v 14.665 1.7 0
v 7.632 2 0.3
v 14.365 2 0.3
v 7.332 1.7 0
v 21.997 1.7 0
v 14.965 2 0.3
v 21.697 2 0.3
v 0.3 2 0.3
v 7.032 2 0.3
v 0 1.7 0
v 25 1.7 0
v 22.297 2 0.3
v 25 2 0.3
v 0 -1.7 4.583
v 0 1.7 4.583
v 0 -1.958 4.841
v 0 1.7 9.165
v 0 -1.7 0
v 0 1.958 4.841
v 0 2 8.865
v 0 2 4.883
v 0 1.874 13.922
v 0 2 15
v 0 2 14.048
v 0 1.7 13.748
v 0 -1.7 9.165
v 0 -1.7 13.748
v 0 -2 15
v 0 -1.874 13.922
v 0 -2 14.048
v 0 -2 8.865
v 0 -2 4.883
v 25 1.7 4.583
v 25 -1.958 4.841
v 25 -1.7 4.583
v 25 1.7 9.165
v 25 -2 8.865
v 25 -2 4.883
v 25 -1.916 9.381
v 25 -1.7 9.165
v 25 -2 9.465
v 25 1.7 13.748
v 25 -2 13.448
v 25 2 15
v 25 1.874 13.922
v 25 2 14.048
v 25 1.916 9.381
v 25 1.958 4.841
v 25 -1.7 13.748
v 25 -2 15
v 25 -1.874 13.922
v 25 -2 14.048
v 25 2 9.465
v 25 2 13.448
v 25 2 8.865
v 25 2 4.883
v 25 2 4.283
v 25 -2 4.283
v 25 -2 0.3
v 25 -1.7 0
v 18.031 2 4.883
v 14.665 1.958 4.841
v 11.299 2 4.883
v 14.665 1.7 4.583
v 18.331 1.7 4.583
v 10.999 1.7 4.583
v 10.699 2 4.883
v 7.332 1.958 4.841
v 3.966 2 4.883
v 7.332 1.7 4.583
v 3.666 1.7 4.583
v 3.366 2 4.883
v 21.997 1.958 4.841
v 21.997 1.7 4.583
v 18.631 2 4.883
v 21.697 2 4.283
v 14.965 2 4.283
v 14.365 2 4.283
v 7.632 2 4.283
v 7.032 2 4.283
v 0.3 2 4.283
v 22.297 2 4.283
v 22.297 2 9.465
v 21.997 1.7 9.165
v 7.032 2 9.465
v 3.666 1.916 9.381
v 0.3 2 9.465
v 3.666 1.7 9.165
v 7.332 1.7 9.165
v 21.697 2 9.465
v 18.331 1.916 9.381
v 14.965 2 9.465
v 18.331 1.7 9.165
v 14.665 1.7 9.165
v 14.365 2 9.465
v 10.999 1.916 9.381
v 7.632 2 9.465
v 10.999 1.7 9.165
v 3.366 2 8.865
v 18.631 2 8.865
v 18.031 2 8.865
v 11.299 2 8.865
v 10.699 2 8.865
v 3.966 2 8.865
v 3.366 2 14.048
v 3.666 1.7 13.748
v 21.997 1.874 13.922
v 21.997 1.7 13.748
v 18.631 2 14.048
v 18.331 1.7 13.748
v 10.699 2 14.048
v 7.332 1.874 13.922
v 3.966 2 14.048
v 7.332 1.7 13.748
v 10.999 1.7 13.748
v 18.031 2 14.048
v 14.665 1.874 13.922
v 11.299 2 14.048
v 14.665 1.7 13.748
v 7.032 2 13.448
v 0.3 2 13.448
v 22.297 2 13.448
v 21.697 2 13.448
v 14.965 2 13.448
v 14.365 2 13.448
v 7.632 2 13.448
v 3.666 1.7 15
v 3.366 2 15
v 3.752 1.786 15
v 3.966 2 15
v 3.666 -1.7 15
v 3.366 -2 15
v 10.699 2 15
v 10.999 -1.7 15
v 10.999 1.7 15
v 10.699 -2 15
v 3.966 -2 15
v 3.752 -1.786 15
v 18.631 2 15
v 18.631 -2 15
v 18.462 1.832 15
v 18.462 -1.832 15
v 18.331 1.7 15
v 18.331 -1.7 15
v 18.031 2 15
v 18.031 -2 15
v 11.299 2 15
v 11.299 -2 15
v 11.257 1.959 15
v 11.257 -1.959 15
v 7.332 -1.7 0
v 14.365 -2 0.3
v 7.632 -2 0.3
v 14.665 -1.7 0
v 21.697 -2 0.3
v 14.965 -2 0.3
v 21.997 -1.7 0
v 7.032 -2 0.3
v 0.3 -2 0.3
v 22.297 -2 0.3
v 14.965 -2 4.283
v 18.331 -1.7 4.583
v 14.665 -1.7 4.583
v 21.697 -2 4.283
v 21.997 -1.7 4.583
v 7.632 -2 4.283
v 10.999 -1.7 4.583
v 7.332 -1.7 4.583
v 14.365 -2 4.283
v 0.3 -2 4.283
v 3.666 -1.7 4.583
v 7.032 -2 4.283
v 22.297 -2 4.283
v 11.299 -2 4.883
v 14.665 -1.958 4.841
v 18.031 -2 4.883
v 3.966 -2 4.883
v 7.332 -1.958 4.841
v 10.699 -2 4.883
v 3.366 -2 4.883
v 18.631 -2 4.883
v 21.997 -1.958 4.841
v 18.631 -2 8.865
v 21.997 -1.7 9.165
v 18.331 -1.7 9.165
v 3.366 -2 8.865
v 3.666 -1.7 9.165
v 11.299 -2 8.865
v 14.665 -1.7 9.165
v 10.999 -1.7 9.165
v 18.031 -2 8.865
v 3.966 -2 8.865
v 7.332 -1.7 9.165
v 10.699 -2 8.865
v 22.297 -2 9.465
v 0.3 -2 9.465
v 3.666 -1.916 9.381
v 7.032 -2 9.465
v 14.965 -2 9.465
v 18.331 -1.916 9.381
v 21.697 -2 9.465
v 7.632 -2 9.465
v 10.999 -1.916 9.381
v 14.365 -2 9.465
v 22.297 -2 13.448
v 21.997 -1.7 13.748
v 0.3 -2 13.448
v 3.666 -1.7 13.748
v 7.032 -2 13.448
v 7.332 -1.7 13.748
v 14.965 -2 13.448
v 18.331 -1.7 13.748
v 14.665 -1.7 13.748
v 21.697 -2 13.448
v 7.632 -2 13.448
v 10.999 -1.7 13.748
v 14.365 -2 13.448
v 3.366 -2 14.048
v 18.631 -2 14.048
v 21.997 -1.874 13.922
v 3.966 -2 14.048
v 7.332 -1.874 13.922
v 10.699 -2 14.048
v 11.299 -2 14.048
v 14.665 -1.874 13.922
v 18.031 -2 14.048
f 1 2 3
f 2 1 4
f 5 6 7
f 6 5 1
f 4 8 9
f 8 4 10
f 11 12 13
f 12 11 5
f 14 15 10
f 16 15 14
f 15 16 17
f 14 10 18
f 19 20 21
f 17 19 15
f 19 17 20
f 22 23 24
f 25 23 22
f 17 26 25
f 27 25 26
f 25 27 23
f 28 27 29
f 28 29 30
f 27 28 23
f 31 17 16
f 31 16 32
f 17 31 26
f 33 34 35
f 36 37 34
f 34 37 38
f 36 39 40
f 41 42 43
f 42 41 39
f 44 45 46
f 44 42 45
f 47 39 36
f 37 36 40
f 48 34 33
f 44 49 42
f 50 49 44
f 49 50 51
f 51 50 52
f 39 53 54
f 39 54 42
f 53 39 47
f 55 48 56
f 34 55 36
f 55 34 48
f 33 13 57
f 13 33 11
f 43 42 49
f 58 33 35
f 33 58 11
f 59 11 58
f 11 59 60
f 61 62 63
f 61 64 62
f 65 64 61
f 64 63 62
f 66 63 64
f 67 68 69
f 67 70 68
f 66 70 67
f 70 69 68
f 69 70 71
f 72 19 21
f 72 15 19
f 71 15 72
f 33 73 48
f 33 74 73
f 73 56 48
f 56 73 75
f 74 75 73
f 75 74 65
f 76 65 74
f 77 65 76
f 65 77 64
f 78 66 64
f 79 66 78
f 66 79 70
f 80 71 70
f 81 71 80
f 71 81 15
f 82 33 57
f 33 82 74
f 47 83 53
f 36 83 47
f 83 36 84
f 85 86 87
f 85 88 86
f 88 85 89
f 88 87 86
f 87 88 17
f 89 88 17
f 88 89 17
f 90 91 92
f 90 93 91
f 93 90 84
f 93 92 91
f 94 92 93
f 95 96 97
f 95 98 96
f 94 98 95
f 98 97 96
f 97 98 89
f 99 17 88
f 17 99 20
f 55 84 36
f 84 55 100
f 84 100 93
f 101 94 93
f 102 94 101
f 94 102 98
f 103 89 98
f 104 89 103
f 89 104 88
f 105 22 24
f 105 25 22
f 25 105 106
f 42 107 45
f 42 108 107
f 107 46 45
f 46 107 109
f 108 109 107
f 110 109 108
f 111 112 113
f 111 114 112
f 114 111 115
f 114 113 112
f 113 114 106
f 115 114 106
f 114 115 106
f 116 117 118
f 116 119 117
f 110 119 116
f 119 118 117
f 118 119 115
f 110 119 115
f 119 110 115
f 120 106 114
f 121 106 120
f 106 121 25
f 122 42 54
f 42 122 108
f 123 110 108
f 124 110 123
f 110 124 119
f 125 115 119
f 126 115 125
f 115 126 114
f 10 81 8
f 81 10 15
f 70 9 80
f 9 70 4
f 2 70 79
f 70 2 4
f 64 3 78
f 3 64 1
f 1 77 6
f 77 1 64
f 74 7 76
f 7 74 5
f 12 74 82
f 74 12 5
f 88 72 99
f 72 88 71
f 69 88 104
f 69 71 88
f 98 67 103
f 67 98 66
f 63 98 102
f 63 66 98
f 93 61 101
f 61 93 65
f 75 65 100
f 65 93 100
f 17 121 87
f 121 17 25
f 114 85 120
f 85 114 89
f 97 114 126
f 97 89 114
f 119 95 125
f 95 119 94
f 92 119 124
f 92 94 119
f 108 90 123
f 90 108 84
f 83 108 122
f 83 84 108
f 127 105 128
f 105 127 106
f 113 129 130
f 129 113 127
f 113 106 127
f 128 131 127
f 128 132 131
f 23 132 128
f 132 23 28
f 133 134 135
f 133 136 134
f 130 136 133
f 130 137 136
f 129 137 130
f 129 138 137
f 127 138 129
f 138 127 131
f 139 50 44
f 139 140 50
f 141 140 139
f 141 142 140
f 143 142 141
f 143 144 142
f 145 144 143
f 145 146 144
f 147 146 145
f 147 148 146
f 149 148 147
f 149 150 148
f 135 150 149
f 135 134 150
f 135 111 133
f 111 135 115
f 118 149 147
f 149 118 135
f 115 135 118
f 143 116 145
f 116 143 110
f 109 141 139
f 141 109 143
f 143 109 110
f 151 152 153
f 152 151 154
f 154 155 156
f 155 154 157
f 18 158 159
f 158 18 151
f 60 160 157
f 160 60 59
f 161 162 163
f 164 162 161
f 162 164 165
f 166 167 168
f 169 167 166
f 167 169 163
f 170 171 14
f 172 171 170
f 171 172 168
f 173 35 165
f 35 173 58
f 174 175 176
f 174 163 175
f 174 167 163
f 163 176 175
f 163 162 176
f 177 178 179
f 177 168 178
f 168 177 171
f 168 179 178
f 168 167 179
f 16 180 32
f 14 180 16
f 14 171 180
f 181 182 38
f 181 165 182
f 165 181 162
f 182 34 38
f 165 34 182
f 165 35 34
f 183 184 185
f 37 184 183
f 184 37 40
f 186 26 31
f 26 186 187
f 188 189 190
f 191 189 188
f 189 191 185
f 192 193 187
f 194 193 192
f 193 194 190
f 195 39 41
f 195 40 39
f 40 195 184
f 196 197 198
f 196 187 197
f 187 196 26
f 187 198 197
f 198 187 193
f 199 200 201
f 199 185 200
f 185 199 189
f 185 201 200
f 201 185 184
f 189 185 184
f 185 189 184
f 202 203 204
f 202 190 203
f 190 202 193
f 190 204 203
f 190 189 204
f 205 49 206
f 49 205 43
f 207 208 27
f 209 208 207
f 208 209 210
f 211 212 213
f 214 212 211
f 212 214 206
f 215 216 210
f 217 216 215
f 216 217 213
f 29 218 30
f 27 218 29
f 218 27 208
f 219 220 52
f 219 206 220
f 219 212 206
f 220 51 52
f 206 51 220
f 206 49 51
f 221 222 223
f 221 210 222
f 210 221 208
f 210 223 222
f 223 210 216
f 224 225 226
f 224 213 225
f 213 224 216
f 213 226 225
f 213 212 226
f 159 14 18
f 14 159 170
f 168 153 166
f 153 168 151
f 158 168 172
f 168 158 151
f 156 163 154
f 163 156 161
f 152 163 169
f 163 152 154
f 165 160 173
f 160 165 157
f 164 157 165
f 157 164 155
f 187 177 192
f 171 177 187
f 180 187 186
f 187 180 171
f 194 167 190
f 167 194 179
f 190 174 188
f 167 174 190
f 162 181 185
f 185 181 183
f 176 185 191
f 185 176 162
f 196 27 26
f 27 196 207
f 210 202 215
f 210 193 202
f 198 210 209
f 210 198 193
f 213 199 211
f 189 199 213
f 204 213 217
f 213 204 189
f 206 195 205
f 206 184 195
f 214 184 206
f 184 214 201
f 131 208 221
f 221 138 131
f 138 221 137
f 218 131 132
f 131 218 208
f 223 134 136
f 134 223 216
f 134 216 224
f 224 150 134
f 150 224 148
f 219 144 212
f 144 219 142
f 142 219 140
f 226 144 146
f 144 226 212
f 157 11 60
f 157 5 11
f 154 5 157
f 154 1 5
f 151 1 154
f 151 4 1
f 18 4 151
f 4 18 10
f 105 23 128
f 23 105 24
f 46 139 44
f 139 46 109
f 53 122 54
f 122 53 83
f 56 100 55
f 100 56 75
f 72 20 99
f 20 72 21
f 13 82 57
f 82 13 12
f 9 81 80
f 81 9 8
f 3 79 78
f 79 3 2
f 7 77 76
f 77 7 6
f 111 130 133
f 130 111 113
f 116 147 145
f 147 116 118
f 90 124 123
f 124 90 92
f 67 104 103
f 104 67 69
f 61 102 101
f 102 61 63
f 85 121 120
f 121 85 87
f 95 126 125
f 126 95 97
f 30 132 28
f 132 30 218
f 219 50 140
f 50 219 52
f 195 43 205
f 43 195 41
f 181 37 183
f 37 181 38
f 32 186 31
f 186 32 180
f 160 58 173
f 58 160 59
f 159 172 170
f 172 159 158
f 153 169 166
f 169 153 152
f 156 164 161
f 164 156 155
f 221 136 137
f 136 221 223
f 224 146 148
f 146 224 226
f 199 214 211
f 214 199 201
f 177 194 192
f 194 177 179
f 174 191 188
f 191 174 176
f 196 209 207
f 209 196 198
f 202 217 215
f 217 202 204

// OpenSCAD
// file: ClippingAlgorithm.scad
/*
    Use Cohen-Sutherland clipping algorithm to clip a line segment to a bounding box
*/

INSIDE = [false,false,false,false];
LEFT   = [false,false,false,true];
RIGHT  = [false,false,true,false];
BOTTOM = [false,true,false,false];
TOP    = [true,false,false,false];

function _combine_codes(a, b, f) = [ for (i = [0:3]) f(a[i], b[i]) ];
function _or(a, b) = [ for (i = [0:3]) a[i] || b[i] ];
function _and(a, b) = [ for (i = [0:3]) a[i] && b[i] ];

function _compute_out_code(p, bounds) =
    let(x_code = (p.x < bounds[0]) ? LEFT : (p.x > bounds[2]) ? RIGHT : INSIDE)
        _or(x_code, (p.y < bounds[1]) ? BOTTOM : (p.y > bounds[3]) ? TOP : INSIDE);

function _clip_segment_to_bounds(p0, p1, bounds, code0, code1) =
    (_or(code0, code1) == INSIDE) ? [p0, p1]
        : (_and(code0, code1) != INSIDE) ? []
        : let(
            out_code = (code0 == INSIDE) ? code1 : code0,
            dx = p1.x - p0.x,
            dy = p1.y - p0.y,
            p = out_code[0] ? [p0.x + dx * (bounds[3] - p0.y) / dy, bounds[3] ]
                : out_code[1] ? [p0.x + dx * (bounds[1] - p0.y) / dy, bounds[1] ]
                : out_code[2] ? [bounds[2], p0.y + dy * (bounds[2] - p0.x) / dx ]
                : out_code[3] ? [bounds[0], p0.y + dy * (bounds[0] - p0.x) / dx ]
                : [])
              (out_code == code0)
                ? _clip_segment_to_bounds(p, p1, bounds, _compute_out_code(p, bounds), code1)
                : _clip_segment_to_bounds(p0, p, bounds, code0, _compute_out_code(p, bounds));

/*
    Clip a line segment (p0, p1) to a bounding box (bounds)
    returns: either [] (if segment is outside the bounds), or a new segment that is inside the bounds`
*/
function clip_segment_to_bounds(p0, p1, bounds) =
    //echo("clip_segment_to_bounds: ", p0=p0, p1=p1, bounds=bounds)
    let (
        code0 = _compute_out_code(p0, bounds),
        code1 = _compute_out_code(p1, bounds))
    _clip_segment_to_bounds(p0, p1, bounds, code0, code1);
// file: Association.scad
/*
    Defines an association (i.e., dictionary) function, that given a keyword,
    returns the matching value.
*/

/*
    Get value from association
 */
function get(assoc, key, default=undef) =
    let (p = [ for (pair = assoc) if (pair[0] == key) pair[1] ])
    (p[0] == undef) ? default : p[0];

/*
    Create an associative array
 */
function associate(values) =
    let (
        count = len(values)/2,
        _data = [ for (i = [0:2:len(values)-1]) [values[i], values[i+1]] ]
    )
    function (key, default, list=false) !list ? get(_data, key, default) : values;

/*
    Merge two associations, giving the second preference
 */
function merge_associations(a, b) =
    associate(concat(b(list=true),a(list=true)));
// file: HexUtils.scad
/*
    Basic computations and shapes for working with hexes

    see https://www.redblobgames.com/grids/hexagons/ for detailed description

    Hexes are oriented with points along the y axis, and usually referenced by
    axial coordinates (row is normal, col is tilted by 60 degrees from vertical.
    See shape positions functions for more detail.
*/
include <ListUtils.scad>;
/*
The hex size is used as the default size for hexes throughout the code. It is
the minimal diameter - i.e., distance between opposite sides.
*/
//DEFAULT_HEX_SIZE = 25.4; // fits miniature base of 1"
//DEFAULT_HEX_SIZE = 38.1; // fits miniature base of 1.5"
DEFAULT_HEX_SIZE = 31.750; // fits miniature base of 1.25" (i.e., BattleTech maps)

Q_BASIS = [0,1]; // horizontal unit vector
R_BASIS = [1,1]; // diagonal unit vector

function default(value, default) = (value == undef) ? default : value;
function is_odd(x) = (x % 2) != 0;

function size_to_height(size) = (2 / sqrt(3)) * size;
function size_to_side(size) = size_to_height(size) / 2;

DEFAULT_SIDE = size_to_side(DEFAULT_HEX_SIZE); // hex side length


/*
 Convert axial coordinates to cubic
*/
function axial_to_cubic(axial) = [axial.x, -axial.x - axial.y, axial.y];

/*
 Convert cubic to axial
*/
function cubic_to_axial(cubic) = [cubic.x, cubic.z];

/*
 half-step in x and y directions
*/
function dx(size=DEFAULT_HEX_SIZE) = 0.5 * size;
function dy(size=DEFAULT_HEX_SIZE) = 0.5 * size / sqrt(3);

/*
 compute side length for a given hex size
*/
function size_to_side(size) = size / sqrt(3);

/*
 compute hex size or a given side length
*/
function side_to_size(side) = side * sqrt(3);

/*
 Distance between two axial points
 */
function axial_distance(a, b) =
    (abs(a.x -b.x) + abs(a.x + a.y - b.x - b.y) + abs(a.y - b.y)) / 2;

/*
 Convert axial hex coordinates to cartesian coordinates
*/
function axial_to_xy(axial, size=DEFAULT_HEX_SIZE) = [dx(size) * (2*axial.x + axial.y), dy(size) * 3 * axial.y, 0];

/*
 Create a 2d hex with center at the origin
*/
module hex_shape(size) {
    _dx = dx(size);
    _dy = dy(size);
    polygon([[0,2*_dy],[_dx,_dy],[_dx,-_dy],[0,-2*_dy],[-_dx,-_dy],[-_dx,_dy]]);
}

/*
 Create a 2d hex with beveled corners with center at the origin
*/
module beveled_hex_shape(size, bevel=0.5) {
    _dx = dx(size-bevel);
    _dy = dy(size-bevel);
    offset(r=bevel/2, chamfer=true) {
        polygon([[0,2*_dy],[_dx,_dy],[_dx,-_dy],[0,-2*_dy],[-_dx,-_dy],[-_dx,_dy]]);
    }
}

/*
 Returns the axial coordinates of a given rectangular offset value/ Assumes 0,0 is offset 0 at lower left
*/
function rectangle_offset_to_axial(size, offset) =
    let(
        x = offset % size.x,
        y = (offset - x) / size.x)
    [x - (y + (is_odd(y) ? 1 : 0)) / 2, y];

// Direction
ANGLES_FOR_DIRECTION = [ 0, 60, 120, 180, 240, 300 ];
STEP_FOR_DIRECTION = [ [1,0], [0,1], [-1,1], [-1,0], [0,-1], [1,-1] ];

/*
    add offset coordinate to each coordinate in positions
*/
function shift(positions, offset) =
    [ for (p = positions) p + offset ];

/*
    invert the order of the rows in positions
*/
function invert_rows(positions) =
    let(
        ys = [for (p = positions) p.y],
        row_span = max(ys) - min(ys),
        first_row = [for (p = positions) if (p.y == positions[0].y) p],
        remaining_rows = [for (p = positions) if (p.y != positions[0].y) p])
    (len(remaining_rows) == 0)
        ? first_row
        : concat(
            shift(invert_rows(remaining_rows), [0,1]),
            shift(first_row, [row_span, -row_span]));

/*
    return an array containing the number of hexes in each positive row (0..size-1)
*/
function hexes_per_row(size) =
    [for (i = [size.y-1:-1:0]) (size.x + size.y - 1) - i];

/*
 Returns an array of axial (row,col) coordinates in a hexagon pattern of the
 given size. For example, hex_position(3,2):
              <--- 3 ---->
      /     0,1   1,1   2,1
    2 -  0,0   1,0   2,0   3,0
            1,-1  2,-1  3,-1
*/
function hex_positions(size) =
    let (_size = (size[0] == undef) ? [size, size] : size)
    concat(trapezoid_positions(_size),
        (_size.y == 1) ? [] : shift(invert_rows(trapezoid_positions([_size.x, _size.y-1])), [1,1-_size.y]));

/*
 Returns an array of axial (row,col) coordinates in a rectangle pattern of the
 given size. For example, rectangle_position(3,2):
              <--- 3 ---->
      /     0,1   1,1   2,1   3,1
    2 -  0,0   1,0   2,0   3,0
*/
function rect_positions(size) =
    let (_size = (size[0] == undef) ? [size, size] : size)
    [for (i = range(size.x * size.y)) rectangle_offset_to_axial(size, i)];

/*
 Returns an array of axial (row,col) coordinates in a trapezoid pattern of the
 given size. For example, trapezoid_position(3,2):
              <--- 3 ---->
      /     0,1   1,1   2,1
    2 -  0,0   1,0   2,0   3,0

    Note: size.x=1 will result in a triangle
*/
function trapezoid_positions(size) =
    let (
        _size = (size[0] == undef) ? [size, size] : size,
        y_max = _size.y - 1,
        counts = hexes_per_row(_size))
    [for (j = [0:y_max]) for (i = range(counts[j])) [i, y_max-j] ];
// file: ListUtils.scad
/*
    Some functions for processing lists
*/

function is_empty(list) = len(list) == 0;
/*
    Return an integer range for an integer or list
*/
function range(count) = is_num(count) ? [0:(count-1)] : [0:(len(count)-1)];

function drop(list, n=1) =
    (n < 0) ? undef
        : (len(list) <= n) ? [] : [ for (i = [n:(len(list)-1)]) list[i] ];

function last(list) = list[len(list)-1];

function drop_last(list, n=1) =
    (n < 0) ? undef
        : (len(list) <= n) ? [] : [ for (i = [0:1:(len(list)-n-1)]) list[i] ];

function append(list, a) = concat(list, [a]);

function concat_to_last(lists, list) =
    is_empty(list) ? lists
        : is_empty(lists) ? [list]
        : concat(drop_last(lists), [concat(last(lists), list)]);

function append_to_last(lists, a) = concat_to_last(lists, [a]);

/*
    Apply a function to every item in a list
*/
function map(list, f) = [ for (v = list) f(v) ];

function fold(list, init, f) =
    is_empty(list) ? init : fold(drop(list, 1), f(init, list[0]), f);

function fold_index(list, init, f, index=0) =
    is_empty(list) ? init : fold_index(drop(list, 1), f(init, list[0], index), f, index+1);

function reduce(list, f) =
    is_empty(list) ? undef
        : (len(list) == 1) ? list[0]
        : f(list[0], reduce(drop(list, 1), f));

function repeat(list, count) =
    (count == 0) ? [] : concat(list, repeat(list, count-1));

function generate(f, count) =
    (count <= 0) ? [] : [ for (i = range(count)) f(i) ];

function remove(list, f) = fold(list, [], function (list,item) f(item) ? list : concat(list, [item]));

function flat_map(list, f) = fold(list, [], function(a,b) concat(a, f(b)));

function map2(a, b, f) = [ for (i = range(a)) f(a[i],b[i]) ];

function is_any(list, pred) = fold(list, false, function (bool,a) bool || pred(a));

function is_all(list, pred) = fold(list, true, function (bool,a) bool && pred(a));

function quicksort(arr, f) =
    !(len(arr)>0) ? []
        : let(pivot   = f(arr[floor(len(arr)/2)]),
              lesser  = [ for (y = arr) if (f(y)  < pivot) y ],
              equal   = [ for (y = arr) if (f(y) == pivot) y ],
              greater = [ for (y = arr) if (f(y)  > pivot) y ]
              )
            concat(quicksort(lesser, f), equal, quicksort(greater, f));

function pop_to_size(new_items, limit, popped_items=[], get_size) =
    (len(new_items) == 0) ? [current_items, new_items]
        : let(
            item = new_items[0],
            size = get_size(item))
        (size > limit) ? [popped_items, new_items]
            : pop_to_size(drop(new_items, 1), limit-size, concat(popped_items, [item]), get_size);

function replace_last(list,item) =
     concat([ for (i = [0:1:(len(list)-2)]) list[i] ], [item]);

function fill(items, limit, get_size, groups=[[]]) =
    (len(items) == 0) ? groups
        : let(
            item = items[0],
            new_items = drop(items, 1),
            last_group = groups[len(groups)-1],
            new_size = get_size(item) + fold(last_group, 0, function(a,b) a+get_size(b)))
          (new_size <= limit)
            ? fill(drop(items,1), limit, get_size, replace_last(groups, concat(last_group, item)))
            : fill(drop(items,1), limit, get_size, concat(groups, [[item]]));

function flatten(arr) = fold(arr, [], function(a,b) concat(a, b));
// file: Barrier.scad
/*
    Create barriers with decoration
*/
include <PatternCutters.scad>;

module barrier_pattern_cutter(size, angle=0, offset=[0,0], scale=[1,1], ends=false, pattern=BLANK_PATTERN) {
    // TODO: expand based on size of wall, pattern
    _ends = is_list(ends) ? ends : [ends, ends];
    echo("barrier_pattern_cutter: scaling: ", wall_size=size, pattern_size=pattern("size"), scale=scale);
    scaled_pattern = scale_pattern(pattern, scale);
    expansion = [ ceil(size.x / scaled_pattern("size").x), ceil(size.z / scaled_pattern("size").y)];
    expanded_pattern = expand_pattern(scaled_pattern, expansion);
    echo("barrier_pattern_cutter: expansion", expansion=expansion, scaled_size=scaled_pattern("size"),
        expanded_size=expanded_pattern("size"));
    cropped_pattern = crop_pattern(expanded_pattern, [size.x, size.z]);
    echo("barrier_pattern_cutter: crop", cropped_pattern("size"));
    rotate([0,0,angle]) {
        x_offset = [0,0,0];
        y_offset = [0,size.y/2,0];
        z_offset = [0,0,size.z];
        cut_pattern(cropped_pattern, offset=x_offset+y_offset+to_3d_point(offset));
        cut_pattern(cropped_pattern, offset=x_offset-y_offset+to_3d_point(offset));
        if (_ends[0]) cut_pattern(expanded_pattern, offset=[0,-size.y/2,0], rotation=[0,0,90]);
        if (_ends[1]) cut_pattern(expanded_pattern, offset=[size.x,-size.y/2,0], rotation=[0,0,90]);
        //cut_pattern(expanded_pattern, offset=[0,size.y/2,size.z], rotation=[90,0,0]);
    }
}

module create_barrier(size, angle=0) {
    rotate([0,0,angle]) {
        translate([0,-size.y/2,0]) cube(size);
    }
}

module patterned_barrier(size, angle=0, offset=[0,0], scale=[1,1], ends=false, pattern=BLANK_PATTERN) {
    //echo("patterned_barrier: ", pattern=pattern(list=true));
    difference() {
        echo("creatnig barrire");
        create_barrier(size, angle);
        #barrier_pattern_cutter(size, angle, offset, scale, ends, pattern);
    }
}
// main file
include <Barrier.scad>

/*
    Create a brick wall with sides, top, ends textured, bottom plain
*/
module test_pattern_barrier() {
    pattern = tag_pattern(pattern=BRICK_PATTERN, tag="test");
    echo("iniital pattern:", pattern=pattern(list=true));
    patterned_barrier(size=[25,4,15], angle=HORIZONTAL_ANGLE, pattern=pattern);
    //translate([0,50,0]) patterned_barrier([25,4,15], angle=HORIZONTAL_ANGLE, offset=[2,-2], scale=[1,2]);
    //translate([-20,0,0]) patterned_barrier([25,4,15], angle=VERTICAL_ANGLE, pattern=WOOD_PATTERN);
}

test_pattern_barrier();
